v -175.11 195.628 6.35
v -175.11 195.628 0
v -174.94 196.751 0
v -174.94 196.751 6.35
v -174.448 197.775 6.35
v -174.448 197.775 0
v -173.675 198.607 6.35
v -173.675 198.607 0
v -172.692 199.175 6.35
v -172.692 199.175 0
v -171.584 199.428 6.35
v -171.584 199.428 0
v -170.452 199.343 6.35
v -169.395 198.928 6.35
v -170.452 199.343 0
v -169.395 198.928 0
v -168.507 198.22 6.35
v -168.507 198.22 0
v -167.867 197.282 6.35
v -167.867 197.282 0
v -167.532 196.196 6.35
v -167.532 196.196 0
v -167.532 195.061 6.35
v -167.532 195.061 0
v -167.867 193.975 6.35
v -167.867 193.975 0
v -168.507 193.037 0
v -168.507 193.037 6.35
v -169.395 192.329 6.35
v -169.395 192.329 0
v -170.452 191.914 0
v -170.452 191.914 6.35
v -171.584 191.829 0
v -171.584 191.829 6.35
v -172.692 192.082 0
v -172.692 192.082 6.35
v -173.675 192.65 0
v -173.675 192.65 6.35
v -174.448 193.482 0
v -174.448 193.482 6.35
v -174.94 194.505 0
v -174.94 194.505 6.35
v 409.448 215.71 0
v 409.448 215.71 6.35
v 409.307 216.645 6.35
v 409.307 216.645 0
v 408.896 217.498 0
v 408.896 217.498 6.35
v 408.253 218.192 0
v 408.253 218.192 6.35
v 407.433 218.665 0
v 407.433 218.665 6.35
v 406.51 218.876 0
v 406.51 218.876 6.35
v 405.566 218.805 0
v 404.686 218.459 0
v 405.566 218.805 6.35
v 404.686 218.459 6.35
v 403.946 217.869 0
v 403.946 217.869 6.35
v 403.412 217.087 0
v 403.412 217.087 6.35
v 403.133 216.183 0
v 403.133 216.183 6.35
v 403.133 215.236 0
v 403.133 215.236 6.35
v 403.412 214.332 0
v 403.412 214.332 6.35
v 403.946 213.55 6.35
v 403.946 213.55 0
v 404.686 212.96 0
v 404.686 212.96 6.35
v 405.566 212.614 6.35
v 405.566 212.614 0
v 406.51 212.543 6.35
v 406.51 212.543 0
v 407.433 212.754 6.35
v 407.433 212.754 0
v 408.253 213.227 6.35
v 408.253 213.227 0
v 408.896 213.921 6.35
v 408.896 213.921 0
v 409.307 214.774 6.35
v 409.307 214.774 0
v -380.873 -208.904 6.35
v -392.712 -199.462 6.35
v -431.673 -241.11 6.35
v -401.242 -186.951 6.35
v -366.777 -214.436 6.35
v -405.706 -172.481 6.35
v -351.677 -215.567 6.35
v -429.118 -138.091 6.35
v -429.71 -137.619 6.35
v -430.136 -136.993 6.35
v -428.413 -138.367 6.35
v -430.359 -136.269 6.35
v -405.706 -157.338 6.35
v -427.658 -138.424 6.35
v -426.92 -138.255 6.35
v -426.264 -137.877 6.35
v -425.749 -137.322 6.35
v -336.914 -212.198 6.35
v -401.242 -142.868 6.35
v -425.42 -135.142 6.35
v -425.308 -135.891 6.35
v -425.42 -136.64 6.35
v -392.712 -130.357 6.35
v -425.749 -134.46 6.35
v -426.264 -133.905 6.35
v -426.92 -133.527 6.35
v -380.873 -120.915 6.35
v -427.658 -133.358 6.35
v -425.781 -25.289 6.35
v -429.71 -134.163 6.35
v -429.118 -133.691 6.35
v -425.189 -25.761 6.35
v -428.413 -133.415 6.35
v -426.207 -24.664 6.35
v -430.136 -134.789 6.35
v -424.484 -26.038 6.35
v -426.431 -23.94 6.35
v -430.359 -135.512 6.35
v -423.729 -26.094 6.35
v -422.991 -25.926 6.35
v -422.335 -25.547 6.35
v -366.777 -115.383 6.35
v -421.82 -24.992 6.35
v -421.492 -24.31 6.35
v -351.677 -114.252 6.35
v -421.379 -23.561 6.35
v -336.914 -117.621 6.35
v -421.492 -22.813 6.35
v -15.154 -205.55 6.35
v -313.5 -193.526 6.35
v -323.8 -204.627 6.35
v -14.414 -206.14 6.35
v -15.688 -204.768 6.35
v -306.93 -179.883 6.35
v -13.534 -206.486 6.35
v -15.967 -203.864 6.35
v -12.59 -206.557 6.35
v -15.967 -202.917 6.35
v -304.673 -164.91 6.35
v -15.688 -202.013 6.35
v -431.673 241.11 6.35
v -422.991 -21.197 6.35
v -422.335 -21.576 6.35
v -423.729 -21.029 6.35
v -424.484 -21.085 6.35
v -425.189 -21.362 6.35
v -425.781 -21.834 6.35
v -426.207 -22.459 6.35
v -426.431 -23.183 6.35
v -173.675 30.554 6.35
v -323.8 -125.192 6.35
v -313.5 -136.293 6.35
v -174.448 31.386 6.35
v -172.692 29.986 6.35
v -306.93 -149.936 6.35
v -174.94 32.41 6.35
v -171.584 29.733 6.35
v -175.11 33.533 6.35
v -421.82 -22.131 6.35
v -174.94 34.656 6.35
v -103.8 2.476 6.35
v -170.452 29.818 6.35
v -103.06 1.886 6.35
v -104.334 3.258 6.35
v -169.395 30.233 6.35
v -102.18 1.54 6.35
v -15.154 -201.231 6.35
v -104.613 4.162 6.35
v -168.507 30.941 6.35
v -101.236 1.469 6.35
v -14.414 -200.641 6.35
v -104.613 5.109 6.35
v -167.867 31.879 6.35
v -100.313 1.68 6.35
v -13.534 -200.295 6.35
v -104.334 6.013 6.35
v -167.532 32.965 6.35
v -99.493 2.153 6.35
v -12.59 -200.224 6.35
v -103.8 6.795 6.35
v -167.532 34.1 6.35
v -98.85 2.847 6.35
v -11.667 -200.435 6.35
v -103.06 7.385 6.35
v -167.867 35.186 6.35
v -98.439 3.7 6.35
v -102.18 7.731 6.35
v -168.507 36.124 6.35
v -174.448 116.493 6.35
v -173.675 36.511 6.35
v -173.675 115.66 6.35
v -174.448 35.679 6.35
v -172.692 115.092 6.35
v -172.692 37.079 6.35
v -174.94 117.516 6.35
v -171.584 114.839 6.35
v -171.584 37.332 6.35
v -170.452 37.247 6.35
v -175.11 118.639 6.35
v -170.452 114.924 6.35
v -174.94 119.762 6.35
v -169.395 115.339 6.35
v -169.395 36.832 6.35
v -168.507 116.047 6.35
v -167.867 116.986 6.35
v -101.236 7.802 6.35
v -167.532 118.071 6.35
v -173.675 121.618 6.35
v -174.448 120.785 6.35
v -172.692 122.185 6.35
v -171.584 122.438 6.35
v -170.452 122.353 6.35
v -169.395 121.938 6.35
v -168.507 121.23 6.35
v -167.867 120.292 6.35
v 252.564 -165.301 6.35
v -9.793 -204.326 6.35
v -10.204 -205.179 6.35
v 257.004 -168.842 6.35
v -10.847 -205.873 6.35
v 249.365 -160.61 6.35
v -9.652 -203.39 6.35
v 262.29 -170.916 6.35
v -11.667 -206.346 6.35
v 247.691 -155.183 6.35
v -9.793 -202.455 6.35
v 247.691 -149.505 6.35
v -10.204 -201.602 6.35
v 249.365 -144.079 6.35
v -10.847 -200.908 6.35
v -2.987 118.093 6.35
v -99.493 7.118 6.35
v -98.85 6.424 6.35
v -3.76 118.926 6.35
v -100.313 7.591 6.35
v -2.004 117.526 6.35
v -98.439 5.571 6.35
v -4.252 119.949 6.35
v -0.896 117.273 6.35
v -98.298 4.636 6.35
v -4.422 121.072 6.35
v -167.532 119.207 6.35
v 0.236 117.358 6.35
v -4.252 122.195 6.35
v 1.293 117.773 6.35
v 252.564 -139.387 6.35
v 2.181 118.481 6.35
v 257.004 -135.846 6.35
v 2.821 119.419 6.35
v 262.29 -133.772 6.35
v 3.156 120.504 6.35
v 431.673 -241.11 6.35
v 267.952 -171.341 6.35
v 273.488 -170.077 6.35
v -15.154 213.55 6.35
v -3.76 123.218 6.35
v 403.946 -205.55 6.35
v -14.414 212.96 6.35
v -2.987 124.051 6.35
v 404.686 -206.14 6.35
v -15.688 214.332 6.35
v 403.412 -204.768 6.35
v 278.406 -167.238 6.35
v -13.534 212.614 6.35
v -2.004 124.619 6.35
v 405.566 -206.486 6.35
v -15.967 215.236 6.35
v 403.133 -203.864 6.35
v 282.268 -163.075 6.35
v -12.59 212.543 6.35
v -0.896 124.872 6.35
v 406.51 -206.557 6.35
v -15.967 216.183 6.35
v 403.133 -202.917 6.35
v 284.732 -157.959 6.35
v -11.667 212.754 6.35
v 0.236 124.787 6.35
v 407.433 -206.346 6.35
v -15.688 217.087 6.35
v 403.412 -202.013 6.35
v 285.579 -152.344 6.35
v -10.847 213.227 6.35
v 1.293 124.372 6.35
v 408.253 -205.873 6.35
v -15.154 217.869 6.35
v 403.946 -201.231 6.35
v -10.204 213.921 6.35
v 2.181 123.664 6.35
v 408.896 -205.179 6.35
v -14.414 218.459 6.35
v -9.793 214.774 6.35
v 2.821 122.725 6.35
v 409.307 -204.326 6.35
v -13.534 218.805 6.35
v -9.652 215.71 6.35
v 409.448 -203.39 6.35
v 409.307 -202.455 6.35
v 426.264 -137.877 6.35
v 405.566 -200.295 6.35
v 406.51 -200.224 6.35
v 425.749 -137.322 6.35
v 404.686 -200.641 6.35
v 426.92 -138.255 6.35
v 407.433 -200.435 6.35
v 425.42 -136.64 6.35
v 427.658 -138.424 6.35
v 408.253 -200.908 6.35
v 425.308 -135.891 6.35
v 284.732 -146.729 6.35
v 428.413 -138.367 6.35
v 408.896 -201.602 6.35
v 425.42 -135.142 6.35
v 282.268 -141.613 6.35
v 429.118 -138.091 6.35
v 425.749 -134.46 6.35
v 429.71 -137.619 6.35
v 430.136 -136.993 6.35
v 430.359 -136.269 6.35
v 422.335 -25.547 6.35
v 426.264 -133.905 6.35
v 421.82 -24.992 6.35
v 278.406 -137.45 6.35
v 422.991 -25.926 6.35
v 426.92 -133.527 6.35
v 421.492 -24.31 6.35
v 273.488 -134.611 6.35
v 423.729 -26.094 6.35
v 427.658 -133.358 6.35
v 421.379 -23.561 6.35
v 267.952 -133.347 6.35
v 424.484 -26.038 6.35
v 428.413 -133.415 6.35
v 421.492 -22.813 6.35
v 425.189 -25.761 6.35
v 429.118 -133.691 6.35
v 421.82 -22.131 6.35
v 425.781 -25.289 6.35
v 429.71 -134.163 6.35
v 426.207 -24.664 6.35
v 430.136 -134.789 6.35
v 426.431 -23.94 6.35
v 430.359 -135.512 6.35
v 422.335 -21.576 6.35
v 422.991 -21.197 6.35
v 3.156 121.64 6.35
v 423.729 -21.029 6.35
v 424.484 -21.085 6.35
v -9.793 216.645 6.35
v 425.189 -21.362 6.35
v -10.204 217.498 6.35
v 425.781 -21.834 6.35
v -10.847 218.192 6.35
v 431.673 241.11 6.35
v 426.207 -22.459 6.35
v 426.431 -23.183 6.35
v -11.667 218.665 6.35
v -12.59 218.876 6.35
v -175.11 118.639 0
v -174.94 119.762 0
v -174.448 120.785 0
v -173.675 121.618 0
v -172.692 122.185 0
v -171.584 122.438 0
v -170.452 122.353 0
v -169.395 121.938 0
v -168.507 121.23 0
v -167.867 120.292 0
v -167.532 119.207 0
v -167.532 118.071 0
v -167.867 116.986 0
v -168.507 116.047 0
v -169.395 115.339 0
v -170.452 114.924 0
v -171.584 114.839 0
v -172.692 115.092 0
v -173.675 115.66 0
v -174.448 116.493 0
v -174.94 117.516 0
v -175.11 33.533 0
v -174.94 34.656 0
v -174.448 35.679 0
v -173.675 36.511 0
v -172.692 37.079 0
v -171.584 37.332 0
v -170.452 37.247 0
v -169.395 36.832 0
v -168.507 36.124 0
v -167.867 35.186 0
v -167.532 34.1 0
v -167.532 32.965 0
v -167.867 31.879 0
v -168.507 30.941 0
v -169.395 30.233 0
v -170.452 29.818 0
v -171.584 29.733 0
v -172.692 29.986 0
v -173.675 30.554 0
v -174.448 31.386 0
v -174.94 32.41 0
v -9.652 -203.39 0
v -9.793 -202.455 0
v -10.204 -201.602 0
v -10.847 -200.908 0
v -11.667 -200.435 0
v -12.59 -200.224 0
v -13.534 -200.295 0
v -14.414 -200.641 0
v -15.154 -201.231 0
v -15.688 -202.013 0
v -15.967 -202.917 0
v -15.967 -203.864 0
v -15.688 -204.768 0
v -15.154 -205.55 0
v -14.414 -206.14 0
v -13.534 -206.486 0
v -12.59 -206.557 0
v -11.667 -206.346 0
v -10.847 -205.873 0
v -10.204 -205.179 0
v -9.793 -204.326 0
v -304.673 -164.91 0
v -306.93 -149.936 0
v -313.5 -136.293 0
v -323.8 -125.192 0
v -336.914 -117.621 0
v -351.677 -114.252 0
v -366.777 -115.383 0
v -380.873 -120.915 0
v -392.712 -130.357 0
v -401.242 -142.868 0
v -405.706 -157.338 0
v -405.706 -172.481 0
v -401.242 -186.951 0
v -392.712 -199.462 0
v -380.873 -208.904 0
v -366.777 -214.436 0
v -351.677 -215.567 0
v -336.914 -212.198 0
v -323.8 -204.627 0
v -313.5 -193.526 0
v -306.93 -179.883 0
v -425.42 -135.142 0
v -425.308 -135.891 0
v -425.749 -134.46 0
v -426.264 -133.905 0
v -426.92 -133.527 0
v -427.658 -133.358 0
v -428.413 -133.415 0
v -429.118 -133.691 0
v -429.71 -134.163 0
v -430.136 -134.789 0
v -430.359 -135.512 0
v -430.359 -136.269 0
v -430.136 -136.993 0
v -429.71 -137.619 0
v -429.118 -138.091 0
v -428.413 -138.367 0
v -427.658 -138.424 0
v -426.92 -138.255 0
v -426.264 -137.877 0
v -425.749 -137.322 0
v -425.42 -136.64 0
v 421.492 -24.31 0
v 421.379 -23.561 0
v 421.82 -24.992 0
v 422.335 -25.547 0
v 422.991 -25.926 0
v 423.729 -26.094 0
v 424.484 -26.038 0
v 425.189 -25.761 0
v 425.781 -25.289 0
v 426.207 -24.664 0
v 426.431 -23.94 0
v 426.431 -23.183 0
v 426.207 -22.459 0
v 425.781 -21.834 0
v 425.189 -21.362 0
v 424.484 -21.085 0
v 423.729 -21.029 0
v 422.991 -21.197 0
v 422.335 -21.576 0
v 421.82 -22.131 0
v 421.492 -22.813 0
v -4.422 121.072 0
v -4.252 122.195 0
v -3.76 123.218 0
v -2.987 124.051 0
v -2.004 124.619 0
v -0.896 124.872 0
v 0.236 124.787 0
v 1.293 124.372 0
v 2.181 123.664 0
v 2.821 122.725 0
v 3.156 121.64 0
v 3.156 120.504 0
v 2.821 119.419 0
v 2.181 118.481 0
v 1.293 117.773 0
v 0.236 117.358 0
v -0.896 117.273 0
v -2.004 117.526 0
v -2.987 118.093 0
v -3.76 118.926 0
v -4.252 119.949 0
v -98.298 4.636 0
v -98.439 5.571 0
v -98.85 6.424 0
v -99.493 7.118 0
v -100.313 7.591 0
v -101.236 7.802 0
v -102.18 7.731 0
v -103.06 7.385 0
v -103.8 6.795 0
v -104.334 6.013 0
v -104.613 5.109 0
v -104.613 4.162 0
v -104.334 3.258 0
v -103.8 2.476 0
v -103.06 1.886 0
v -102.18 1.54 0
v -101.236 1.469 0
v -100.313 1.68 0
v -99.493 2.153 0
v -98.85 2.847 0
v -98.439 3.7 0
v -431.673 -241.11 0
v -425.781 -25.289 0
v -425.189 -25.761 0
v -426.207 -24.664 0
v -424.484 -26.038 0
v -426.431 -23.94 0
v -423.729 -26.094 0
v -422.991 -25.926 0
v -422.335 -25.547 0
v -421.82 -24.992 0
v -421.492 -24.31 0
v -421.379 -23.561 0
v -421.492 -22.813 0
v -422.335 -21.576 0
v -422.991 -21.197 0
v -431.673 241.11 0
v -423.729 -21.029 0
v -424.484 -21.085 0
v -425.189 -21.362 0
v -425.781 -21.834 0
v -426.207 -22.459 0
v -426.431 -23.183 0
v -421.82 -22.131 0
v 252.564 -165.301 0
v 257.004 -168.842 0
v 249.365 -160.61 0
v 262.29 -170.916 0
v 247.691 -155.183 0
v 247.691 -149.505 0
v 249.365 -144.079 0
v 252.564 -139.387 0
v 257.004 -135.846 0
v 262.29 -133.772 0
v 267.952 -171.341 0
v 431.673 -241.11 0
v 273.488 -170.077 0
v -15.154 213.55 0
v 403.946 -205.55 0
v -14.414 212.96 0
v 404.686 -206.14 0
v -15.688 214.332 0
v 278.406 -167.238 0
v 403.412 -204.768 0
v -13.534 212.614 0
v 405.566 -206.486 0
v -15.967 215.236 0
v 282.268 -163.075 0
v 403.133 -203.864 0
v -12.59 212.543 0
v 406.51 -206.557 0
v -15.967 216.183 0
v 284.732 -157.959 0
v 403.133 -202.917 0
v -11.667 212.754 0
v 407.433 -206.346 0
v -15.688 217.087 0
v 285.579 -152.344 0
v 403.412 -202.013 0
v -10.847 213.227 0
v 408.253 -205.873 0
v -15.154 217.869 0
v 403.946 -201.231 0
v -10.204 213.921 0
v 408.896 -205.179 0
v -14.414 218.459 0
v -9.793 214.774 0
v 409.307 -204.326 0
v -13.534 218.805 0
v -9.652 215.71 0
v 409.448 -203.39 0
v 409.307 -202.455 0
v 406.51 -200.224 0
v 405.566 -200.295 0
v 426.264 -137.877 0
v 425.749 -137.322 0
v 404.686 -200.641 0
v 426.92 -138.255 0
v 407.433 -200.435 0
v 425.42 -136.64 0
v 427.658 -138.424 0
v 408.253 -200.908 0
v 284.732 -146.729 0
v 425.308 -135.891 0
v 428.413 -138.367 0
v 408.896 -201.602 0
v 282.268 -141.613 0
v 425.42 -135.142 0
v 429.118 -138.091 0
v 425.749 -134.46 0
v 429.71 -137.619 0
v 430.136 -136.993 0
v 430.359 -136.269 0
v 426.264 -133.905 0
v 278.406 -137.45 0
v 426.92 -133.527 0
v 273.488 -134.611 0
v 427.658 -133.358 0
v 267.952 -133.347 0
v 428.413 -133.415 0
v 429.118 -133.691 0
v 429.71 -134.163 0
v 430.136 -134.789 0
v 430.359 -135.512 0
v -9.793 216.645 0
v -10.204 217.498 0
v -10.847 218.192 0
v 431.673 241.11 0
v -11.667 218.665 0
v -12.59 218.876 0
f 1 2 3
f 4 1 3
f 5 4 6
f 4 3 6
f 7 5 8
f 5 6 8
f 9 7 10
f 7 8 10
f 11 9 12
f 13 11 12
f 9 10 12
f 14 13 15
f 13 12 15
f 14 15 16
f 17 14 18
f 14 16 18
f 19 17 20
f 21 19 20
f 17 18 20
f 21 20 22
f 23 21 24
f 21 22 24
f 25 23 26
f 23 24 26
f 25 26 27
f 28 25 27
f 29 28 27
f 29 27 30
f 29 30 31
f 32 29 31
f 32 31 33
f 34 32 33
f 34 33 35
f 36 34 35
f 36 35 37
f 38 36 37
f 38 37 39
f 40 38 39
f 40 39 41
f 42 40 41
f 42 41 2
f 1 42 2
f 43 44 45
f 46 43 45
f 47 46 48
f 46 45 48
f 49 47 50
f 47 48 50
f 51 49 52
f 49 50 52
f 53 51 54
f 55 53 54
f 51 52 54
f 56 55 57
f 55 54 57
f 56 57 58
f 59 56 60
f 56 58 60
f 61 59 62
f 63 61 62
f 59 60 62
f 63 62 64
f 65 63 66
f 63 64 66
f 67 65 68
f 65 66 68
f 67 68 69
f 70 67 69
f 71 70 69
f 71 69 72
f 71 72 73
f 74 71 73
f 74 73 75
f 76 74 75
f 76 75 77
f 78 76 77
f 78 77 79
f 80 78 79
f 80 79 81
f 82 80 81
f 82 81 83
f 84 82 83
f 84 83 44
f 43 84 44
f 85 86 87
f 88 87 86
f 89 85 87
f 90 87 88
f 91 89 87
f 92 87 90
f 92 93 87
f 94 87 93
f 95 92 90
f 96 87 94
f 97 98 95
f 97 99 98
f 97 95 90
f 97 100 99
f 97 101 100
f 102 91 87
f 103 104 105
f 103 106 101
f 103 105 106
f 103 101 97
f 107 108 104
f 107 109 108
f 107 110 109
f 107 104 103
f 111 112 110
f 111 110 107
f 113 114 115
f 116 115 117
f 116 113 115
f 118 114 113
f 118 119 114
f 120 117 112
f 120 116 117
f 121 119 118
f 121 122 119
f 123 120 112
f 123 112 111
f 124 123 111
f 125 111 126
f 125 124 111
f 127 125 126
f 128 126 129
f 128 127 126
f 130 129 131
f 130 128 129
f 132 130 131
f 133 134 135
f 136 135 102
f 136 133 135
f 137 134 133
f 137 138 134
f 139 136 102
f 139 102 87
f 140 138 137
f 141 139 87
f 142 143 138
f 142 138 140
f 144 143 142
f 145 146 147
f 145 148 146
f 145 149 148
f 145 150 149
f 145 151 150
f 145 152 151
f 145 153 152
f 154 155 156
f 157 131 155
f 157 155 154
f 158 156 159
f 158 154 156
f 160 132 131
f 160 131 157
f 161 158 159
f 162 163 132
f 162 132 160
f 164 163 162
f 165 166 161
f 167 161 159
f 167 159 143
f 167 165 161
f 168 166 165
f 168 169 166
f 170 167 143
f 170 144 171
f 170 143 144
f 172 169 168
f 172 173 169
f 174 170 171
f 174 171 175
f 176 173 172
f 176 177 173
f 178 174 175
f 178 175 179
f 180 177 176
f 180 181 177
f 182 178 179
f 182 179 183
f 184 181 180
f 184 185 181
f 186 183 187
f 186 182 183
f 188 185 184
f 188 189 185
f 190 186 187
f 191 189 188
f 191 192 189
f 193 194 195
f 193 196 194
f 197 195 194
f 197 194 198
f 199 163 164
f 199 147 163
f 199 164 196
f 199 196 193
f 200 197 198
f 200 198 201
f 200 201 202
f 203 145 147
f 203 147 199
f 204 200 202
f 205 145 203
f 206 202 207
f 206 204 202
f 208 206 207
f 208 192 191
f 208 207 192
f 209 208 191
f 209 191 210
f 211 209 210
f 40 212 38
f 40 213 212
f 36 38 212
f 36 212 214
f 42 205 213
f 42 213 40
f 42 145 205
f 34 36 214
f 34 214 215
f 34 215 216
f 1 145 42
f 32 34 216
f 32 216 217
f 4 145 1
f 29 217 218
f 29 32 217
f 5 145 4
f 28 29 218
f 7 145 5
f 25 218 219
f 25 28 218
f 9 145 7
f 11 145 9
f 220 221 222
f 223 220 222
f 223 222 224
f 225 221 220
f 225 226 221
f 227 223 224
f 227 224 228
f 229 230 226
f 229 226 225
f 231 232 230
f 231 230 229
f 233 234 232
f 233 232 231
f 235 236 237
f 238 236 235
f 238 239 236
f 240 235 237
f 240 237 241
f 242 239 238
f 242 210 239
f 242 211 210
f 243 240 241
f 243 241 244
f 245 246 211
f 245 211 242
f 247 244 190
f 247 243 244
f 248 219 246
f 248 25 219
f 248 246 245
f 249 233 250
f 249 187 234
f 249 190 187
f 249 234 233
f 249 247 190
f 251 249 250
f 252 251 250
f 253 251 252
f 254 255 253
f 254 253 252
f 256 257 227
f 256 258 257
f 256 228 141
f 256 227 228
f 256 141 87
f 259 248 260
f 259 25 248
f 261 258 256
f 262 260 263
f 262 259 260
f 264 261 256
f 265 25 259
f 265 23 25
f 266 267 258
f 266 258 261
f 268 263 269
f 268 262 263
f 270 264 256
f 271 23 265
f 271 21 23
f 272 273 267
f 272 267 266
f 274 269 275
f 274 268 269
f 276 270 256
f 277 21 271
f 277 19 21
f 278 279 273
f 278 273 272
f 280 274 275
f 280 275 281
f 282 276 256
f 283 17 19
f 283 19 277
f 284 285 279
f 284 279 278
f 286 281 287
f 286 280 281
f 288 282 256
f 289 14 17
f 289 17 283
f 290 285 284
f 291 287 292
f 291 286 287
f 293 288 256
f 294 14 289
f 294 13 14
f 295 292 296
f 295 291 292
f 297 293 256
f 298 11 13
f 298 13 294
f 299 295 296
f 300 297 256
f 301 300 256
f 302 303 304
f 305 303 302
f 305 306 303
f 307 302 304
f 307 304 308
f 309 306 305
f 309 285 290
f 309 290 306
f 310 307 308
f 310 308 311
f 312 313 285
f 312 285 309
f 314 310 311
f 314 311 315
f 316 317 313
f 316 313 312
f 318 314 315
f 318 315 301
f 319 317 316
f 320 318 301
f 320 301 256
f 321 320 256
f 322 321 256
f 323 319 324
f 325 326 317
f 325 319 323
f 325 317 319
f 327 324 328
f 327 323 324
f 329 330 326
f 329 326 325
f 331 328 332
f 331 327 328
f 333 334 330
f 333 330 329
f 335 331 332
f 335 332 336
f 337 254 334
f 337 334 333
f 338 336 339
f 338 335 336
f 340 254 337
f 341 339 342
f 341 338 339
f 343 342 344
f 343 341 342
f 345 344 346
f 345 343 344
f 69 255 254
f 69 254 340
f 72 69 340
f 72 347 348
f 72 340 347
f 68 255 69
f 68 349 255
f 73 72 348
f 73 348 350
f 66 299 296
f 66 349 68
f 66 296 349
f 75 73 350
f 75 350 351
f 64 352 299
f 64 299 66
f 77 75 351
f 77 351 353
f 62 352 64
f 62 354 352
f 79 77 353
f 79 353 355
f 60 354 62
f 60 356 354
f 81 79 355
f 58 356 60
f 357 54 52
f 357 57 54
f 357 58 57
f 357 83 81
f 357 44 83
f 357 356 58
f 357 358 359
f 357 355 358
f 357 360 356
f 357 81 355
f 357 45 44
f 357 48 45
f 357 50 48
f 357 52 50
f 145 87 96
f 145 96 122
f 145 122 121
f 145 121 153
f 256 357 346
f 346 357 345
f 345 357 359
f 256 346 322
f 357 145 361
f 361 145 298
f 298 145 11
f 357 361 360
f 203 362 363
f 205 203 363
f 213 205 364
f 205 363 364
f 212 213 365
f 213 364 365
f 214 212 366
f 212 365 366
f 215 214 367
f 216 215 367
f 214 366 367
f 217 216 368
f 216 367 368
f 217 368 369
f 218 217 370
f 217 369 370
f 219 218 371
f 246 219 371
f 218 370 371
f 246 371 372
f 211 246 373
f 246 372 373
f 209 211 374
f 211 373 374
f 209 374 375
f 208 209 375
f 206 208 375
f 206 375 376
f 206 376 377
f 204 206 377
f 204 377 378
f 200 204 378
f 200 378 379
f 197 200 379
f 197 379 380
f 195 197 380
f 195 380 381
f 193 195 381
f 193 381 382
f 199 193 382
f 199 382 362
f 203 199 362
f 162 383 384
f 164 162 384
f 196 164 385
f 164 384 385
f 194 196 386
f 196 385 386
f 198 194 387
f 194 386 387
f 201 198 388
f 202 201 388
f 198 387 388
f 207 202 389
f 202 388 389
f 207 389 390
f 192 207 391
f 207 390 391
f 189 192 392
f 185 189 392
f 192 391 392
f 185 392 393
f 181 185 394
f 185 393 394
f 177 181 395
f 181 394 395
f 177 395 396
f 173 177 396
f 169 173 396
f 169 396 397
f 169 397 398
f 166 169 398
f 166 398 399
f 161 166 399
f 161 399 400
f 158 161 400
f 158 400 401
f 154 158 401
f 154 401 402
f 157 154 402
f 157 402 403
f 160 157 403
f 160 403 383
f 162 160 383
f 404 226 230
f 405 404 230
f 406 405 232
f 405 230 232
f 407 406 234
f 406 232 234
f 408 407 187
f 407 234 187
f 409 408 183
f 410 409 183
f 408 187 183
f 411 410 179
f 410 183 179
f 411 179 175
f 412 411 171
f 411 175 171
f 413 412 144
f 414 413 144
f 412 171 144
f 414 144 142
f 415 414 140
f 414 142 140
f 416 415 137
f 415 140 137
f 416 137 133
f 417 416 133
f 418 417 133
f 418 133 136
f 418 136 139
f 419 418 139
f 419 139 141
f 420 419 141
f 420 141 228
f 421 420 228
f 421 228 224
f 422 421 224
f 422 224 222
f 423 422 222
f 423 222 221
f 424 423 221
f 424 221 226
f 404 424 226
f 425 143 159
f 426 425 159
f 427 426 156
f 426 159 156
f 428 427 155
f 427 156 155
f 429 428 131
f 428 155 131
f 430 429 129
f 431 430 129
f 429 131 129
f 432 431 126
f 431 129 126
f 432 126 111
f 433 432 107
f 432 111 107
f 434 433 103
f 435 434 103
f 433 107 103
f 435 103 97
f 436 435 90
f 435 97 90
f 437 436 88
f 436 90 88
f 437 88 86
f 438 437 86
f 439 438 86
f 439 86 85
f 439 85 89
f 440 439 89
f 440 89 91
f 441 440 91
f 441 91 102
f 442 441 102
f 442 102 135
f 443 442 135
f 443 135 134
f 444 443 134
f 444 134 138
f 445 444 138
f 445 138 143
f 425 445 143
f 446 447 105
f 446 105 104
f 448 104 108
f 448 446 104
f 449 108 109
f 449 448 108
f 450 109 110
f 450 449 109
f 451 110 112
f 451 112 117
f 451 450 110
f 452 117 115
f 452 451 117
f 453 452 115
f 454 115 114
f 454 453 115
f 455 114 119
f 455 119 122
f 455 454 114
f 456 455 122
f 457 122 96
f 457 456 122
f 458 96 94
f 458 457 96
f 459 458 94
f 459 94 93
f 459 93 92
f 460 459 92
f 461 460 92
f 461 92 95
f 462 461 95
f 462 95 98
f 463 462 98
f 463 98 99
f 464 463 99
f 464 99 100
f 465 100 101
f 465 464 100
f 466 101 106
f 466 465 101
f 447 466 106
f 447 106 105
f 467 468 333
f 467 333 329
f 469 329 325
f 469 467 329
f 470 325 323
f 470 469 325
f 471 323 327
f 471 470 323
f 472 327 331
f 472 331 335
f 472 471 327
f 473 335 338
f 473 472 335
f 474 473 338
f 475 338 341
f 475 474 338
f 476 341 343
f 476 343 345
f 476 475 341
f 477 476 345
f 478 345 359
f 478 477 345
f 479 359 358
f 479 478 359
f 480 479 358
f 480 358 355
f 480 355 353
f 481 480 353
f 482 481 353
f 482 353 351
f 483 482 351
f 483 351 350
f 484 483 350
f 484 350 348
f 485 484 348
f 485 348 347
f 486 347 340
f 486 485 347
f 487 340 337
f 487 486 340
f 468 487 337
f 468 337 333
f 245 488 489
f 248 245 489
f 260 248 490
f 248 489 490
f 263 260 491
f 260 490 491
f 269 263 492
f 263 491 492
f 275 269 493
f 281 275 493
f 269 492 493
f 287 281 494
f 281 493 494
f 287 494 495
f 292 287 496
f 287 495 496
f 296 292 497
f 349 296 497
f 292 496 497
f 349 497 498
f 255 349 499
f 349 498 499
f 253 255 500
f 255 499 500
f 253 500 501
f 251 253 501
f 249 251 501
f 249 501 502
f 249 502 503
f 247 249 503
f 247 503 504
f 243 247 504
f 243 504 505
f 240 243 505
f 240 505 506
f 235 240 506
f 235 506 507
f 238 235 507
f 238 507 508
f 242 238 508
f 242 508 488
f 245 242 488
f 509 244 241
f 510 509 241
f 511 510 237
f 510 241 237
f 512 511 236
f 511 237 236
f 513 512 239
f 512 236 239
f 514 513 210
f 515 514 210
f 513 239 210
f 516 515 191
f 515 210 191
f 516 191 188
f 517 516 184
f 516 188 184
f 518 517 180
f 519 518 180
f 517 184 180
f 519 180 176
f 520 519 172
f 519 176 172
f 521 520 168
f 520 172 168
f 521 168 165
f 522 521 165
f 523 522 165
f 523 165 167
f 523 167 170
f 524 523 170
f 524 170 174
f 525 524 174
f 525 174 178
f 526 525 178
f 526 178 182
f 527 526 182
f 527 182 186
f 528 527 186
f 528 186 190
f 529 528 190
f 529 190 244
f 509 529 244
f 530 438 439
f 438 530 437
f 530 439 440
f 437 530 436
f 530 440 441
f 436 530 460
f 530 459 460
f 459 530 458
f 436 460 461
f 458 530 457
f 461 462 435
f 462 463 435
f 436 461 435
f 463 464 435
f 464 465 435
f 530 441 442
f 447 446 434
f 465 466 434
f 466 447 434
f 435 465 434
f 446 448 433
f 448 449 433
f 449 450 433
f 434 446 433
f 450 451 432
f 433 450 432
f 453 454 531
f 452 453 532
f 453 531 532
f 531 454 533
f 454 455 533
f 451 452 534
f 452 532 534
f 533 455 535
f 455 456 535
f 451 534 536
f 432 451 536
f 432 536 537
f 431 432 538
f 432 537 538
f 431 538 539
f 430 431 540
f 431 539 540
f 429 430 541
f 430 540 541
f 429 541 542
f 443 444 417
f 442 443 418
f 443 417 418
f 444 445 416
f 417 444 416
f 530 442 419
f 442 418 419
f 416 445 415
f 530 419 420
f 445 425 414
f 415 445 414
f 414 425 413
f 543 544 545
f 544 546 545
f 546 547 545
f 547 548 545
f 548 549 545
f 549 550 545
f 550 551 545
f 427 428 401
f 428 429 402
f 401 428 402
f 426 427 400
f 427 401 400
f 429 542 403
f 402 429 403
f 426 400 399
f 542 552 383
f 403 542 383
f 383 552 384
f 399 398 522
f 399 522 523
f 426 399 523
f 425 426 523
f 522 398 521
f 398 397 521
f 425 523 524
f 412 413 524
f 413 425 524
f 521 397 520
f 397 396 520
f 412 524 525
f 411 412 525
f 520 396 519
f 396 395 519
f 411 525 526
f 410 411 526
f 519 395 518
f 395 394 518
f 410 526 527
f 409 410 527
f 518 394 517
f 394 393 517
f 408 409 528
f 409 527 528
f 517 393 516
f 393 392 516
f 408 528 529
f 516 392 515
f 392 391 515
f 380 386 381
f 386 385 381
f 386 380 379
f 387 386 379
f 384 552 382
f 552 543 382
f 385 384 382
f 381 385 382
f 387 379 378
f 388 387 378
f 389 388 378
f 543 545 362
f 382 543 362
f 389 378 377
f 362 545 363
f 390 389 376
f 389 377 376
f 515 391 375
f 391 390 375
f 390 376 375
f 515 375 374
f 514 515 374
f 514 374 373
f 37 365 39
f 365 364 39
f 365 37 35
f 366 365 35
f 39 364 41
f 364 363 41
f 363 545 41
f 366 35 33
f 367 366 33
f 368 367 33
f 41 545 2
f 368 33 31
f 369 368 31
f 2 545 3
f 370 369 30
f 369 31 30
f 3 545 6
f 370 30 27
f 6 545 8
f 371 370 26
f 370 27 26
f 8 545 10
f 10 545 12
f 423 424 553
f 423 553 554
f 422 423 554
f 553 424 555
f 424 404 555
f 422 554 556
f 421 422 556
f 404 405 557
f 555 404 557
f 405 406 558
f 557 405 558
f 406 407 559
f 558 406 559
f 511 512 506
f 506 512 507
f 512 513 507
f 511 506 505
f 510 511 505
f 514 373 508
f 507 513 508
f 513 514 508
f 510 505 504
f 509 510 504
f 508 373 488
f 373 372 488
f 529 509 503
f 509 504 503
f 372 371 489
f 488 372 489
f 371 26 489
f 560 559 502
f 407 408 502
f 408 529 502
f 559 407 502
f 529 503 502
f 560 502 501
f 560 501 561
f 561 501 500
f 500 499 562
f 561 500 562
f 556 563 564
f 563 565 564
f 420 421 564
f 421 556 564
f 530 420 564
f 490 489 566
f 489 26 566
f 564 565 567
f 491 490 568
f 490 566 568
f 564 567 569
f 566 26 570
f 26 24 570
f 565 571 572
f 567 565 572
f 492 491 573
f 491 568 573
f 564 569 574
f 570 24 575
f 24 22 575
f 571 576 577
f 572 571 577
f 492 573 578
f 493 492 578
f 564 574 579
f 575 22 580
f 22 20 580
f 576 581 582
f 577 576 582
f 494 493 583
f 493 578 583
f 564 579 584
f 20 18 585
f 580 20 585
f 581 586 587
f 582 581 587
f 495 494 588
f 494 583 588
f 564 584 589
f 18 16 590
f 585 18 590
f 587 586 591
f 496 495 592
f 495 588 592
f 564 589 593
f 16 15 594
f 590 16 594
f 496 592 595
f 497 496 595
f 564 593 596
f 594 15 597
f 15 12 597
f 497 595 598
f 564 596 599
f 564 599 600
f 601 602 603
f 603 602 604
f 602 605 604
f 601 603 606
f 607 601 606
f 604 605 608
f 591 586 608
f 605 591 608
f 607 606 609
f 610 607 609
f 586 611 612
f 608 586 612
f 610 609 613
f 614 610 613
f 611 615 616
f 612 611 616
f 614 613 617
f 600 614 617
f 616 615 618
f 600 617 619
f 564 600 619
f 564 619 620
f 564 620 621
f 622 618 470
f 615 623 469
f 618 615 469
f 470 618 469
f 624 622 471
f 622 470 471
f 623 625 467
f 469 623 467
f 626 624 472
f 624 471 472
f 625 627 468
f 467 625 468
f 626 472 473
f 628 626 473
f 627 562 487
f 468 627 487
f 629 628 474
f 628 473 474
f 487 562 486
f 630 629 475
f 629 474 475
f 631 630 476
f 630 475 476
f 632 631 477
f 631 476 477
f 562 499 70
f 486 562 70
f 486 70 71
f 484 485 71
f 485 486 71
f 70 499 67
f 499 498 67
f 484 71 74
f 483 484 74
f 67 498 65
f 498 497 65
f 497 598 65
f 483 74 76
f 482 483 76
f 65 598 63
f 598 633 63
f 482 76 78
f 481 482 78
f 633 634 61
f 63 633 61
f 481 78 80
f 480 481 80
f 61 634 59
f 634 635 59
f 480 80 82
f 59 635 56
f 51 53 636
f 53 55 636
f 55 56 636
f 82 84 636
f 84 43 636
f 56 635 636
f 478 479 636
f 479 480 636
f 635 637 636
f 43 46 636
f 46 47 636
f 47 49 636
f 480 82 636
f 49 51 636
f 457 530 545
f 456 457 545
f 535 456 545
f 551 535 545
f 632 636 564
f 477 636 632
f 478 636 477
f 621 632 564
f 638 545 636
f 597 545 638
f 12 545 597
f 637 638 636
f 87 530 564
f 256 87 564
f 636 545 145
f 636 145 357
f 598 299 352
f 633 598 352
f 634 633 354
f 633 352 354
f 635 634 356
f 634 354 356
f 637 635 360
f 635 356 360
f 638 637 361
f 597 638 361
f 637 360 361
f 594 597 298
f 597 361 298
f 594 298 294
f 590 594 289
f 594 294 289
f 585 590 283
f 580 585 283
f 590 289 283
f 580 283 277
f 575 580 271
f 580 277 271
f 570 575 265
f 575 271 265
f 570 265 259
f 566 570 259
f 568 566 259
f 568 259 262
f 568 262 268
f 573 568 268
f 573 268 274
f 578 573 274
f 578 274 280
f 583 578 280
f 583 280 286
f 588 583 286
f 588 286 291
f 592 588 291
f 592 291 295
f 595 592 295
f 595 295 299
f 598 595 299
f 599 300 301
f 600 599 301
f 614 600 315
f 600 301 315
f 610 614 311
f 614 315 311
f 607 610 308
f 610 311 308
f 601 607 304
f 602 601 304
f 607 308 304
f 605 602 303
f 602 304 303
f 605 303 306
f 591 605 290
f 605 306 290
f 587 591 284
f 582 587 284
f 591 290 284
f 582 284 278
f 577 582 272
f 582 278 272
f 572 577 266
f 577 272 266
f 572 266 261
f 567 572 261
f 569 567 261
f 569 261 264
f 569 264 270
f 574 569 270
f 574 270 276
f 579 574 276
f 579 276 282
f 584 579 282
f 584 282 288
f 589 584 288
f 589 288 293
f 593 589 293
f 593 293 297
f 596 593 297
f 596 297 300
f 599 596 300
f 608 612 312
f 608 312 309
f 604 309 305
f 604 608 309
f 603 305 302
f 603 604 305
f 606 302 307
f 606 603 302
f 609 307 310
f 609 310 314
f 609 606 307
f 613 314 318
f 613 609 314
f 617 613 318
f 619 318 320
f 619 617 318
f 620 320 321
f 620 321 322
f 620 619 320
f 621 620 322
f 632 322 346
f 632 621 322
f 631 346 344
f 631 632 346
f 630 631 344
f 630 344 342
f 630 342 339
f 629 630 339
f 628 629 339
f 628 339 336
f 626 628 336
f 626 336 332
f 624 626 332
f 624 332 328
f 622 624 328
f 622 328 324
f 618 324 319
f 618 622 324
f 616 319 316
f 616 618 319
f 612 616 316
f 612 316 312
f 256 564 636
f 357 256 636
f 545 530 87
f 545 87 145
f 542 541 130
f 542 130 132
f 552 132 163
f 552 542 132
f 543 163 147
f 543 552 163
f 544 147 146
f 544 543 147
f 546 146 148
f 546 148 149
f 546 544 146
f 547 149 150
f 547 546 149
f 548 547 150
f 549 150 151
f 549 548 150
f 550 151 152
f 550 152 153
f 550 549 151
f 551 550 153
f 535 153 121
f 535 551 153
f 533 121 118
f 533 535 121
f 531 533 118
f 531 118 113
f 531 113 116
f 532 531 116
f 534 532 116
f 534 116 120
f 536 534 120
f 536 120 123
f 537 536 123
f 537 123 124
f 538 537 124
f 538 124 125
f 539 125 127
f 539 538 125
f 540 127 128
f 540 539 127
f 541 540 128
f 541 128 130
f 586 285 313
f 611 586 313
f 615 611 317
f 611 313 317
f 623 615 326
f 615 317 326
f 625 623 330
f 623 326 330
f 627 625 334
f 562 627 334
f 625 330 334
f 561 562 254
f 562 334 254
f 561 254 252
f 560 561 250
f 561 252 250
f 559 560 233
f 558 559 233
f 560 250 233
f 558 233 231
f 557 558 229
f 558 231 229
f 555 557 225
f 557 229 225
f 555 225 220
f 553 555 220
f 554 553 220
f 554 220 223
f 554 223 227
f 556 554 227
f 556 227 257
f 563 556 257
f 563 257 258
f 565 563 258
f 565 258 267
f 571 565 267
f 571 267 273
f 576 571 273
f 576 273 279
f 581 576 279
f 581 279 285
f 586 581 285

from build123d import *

# Parameters (mm, degrees)
SKETCH1_W           = 863.346
SKETCH1_H           = 482.219
SKETCH1_R           = 2.54
BOSS_EXTRUDE1_DEPTH = 6.35
SKETCH2_R           = 19.05
CUT_EXTRUDE1_DEPTH  = 495.485280286
SKETCH3_R           = 3.81
CUT_EXTRUDE2_DEPTH  = 495.485280286
SKETCH4_R           = 3.175
CUT_EXTRUDE3_DEPTH  = 495.485280286
SKETCH5_R           = 50.8
CUT_EXTRUDE4_DEPTH  = 495.485280286
SKETCH6_R           = 3.175
CUT_EXTRUDE5_DEPTH  = 495.485280286


with BuildPart() as part:
    # Sketch1 → Boss-Extrude1 (new body)
    with BuildSketch(Plane.XY):
        Rectangle(SKETCH1_W, SKETCH1_H)
        with Locations((-423.918892064, -23.561444512)):
            Circle(SKETCH1_R, mode=Mode.SUBTRACT)
        with Locations((-427.847603153, -135.890923479)):
            Circle(SKETCH1_R, mode=Mode.SUBTRACT)
        with Locations(Location((427.847603153, -135.890923479, 0), (0, 0, 180))):
            Circle(SKETCH1_R, mode=Mode.SUBTRACT)
        with Locations(Location((423.918892064, -23.561444512, 0), (0, 0, 180))):
            Circle(SKETCH1_R, mode=Mode.SUBTRACT)
    extrude(amount=BOSS_EXTRUDE1_DEPTH)

    # Sketch2 → Cut-Extrude1 (cut, through all)
    with BuildSketch(Plane.XY.offset(6.35)):
        with Locations((266.52855, -152.344105106)):
            Circle(SKETCH2_R)
    extrude(amount=-CUT_EXTRUDE1_DEPTH, mode=Mode.SUBTRACT)

    # Sketch3 → Cut-Extrude2 (cut, through all)
    with BuildSketch(Plane(origin=(0, 0, 0), x_dir=(-1, 0, 0), z_dir=(0, 0, -1))):
        with Locations((171.299738172, 195.628424293)):
            Circle(SKETCH3_R)
        with Locations((171.299738172, 118.638765896)):
            Circle(SKETCH3_R)
        with Locations((171.299738172, 33.532528438)):
            Circle(SKETCH3_R)
        with Locations((0.611738172, 121.072249047)):
            Circle(SKETCH3_R)
    extrude(amount=-CUT_EXTRUDE2_DEPTH, mode=Mode.SUBTRACT)

    # Sketch4 → Cut-Extrude3 (cut, through all)
    with BuildSketch(Plane.XY.offset(6.35)):
        with Locations((-12.827, 215.7095)):
            Circle(SKETCH4_R)
        with Locations((-12.827, -203.3905)):
            Circle(SKETCH4_R)
        with Locations((406.273, -203.3905)):
            Circle(SKETCH4_R)
        with Locations((406.273, 215.7095)):
            Circle(SKETCH4_R)
    extrude(amount=-CUT_EXTRUDE3_DEPTH, mode=Mode.SUBTRACT)

    # Sketch5 → Cut-Extrude4 (cut, through all)
    with BuildSketch(Plane.XY.offset(6.35)):
        with Locations((-355.473, -164.9095)):
            Circle(SKETCH5_R)
    extrude(amount=-CUT_EXTRUDE4_DEPTH, mode=Mode.SUBTRACT)

    # Sketch6 → Cut-Extrude5 (cut, through all)
    with BuildSketch(Plane.XY.offset(6.35)):
        with Locations((-101.473, 4.6355)):
            Circle(SKETCH6_R)
    extrude(amount=-CUT_EXTRUDE5_DEPTH, mode=Mode.SUBTRACT)


solid = part.part
